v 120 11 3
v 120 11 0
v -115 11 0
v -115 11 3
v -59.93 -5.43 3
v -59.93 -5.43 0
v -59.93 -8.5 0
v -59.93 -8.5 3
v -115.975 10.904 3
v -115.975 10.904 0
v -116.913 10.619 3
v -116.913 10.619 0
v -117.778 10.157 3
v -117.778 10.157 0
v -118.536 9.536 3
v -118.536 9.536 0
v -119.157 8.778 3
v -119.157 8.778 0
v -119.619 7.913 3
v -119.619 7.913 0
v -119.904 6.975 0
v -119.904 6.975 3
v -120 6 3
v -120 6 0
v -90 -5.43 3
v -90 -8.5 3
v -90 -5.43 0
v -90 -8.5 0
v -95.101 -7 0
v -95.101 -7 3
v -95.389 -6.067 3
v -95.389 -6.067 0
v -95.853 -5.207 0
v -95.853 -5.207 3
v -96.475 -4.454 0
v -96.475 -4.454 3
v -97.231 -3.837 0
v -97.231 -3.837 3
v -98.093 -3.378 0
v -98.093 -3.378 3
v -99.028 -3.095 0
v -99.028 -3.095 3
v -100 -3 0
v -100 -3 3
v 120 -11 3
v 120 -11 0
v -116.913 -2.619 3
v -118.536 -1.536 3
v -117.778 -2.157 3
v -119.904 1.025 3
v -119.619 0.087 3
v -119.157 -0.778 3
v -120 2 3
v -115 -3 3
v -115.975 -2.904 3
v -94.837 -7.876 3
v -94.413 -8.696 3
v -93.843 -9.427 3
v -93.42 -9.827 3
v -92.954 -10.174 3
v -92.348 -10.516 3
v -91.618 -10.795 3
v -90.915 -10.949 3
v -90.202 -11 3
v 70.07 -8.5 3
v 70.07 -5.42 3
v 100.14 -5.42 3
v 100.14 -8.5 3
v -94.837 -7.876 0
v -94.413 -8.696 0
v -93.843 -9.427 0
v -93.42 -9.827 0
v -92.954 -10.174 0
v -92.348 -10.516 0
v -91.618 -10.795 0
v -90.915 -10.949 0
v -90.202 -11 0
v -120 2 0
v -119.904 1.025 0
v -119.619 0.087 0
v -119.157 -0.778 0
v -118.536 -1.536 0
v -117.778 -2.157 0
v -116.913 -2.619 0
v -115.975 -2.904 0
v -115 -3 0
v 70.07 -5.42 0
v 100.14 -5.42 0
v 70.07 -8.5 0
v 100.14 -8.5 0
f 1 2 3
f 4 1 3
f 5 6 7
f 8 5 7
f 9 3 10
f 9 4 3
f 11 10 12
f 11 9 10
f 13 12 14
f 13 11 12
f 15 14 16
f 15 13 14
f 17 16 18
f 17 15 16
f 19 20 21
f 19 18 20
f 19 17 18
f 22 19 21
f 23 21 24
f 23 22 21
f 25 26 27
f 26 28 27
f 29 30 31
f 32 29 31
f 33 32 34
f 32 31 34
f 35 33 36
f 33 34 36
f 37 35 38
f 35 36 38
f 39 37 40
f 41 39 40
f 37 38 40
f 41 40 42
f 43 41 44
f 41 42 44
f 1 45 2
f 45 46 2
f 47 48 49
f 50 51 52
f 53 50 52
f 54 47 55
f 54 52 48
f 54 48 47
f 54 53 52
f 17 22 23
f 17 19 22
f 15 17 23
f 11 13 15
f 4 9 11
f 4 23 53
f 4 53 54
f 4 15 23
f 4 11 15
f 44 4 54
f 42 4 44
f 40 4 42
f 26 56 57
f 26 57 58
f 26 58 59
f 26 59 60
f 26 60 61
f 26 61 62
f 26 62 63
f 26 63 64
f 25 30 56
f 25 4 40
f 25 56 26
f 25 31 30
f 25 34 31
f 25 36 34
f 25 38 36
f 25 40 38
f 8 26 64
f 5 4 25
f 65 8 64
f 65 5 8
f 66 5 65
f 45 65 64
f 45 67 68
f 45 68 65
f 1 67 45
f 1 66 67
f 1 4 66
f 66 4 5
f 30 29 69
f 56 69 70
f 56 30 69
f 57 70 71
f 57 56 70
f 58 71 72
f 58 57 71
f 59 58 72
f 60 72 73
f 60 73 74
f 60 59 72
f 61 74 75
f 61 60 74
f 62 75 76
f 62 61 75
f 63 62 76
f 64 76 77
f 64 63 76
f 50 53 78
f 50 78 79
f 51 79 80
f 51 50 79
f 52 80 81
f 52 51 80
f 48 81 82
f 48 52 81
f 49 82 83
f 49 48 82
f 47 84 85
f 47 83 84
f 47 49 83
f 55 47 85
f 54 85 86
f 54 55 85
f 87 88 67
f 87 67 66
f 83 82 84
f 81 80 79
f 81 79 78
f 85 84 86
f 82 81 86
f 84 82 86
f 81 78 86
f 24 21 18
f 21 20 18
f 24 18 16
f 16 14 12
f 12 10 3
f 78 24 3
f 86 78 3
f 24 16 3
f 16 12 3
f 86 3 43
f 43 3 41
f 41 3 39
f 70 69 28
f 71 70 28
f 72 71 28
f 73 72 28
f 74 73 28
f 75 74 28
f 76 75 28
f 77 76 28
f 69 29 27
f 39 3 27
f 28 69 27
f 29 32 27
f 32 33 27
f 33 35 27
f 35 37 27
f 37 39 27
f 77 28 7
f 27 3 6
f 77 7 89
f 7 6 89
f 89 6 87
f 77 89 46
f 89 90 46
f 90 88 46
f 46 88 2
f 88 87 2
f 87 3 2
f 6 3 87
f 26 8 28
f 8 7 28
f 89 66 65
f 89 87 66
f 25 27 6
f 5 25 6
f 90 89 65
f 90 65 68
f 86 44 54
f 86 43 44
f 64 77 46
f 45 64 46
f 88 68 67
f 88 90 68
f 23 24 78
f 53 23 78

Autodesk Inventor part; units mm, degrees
ref_plane "YZ Plane" through (0, 0, 0) normal (1, 0, 0) x (0, 1, 0)
ref_plane "XZ Plane" through (0, 0, 0) normal (0, 1, 0) x (-1, 0, 0)
ref_plane "XY Plane" through (0, 0, 0) normal (0, 0, 1) x (1, 0, 0)
sketch "Sketch1" plane through (0, 0, 0) normal (0, 0, 1) x (1, 0, 0)
  line L0 (-120, -11) -> (120, -11)
  line L1 (120, -11) -> (120, 11)
  line L2 (120, 11) -> (-120, 11)
  line L3 (-120, 11) -> (-120, -11)
  line L4 (-120, -11) -> (120, 11) construction
  line L5 (120, -11) -> (-120, 11) construction
  line L6 (-90, -5.43) -> (-59.93, -5.43)
  line L7 (-59.93, -5.43) -> (-59.93, -8.5)
  line L8 (-59.93, -8.5) -> (-90, -8.5)
  line L9 (-90, -8.5) -> (-90, -5.43)
  line L10 (-90, -5.43) -> (-59.93, -8.5) construction
  line L11 (-59.93, -5.43) -> (-90, -8.5) construction
  line L12 (100.14, -5.42) -> (70.07, -5.42)
  line L13 (70.07, -5.42) -> (70.07, -8.5)
  line L14 (70.07, -8.5) -> (100.14, -8.5)
  line L15 (100.14, -8.5) -> (100.14, -5.42)
  line L16 (100.14, -5.42) -> (70.07, -8.5) construction
  line L17 (70.07, -5.42) -> (100.14, -8.5) construction
  line L18 (-120, -11) -> (-95, -11)
  line L19 (-95, -11) -> (-95, -3)
  line L20 (-95, -3) -> (-120, -3)
  line L21 (-120, -3) -> (-120, -11)
  point P0 (0, 0)
  point P1 (-74.965, -6.965)
  point P2 (85.105, -6.96)
  point P3 (-95, -11)
  dimension "d0" = 240
  dimension "d1" = 22
  dimension "d2" = 30.07
  dimension "d3" = 3.07
  dimension "d4" = 2.5
  dimension "d5" = 30
  dimension "d6" = 30.07
  dimension "d7" = 3.08
  dimension "d8" = 2.5
  dimension "d9" = 130
  dimension "d12" = 25
  dimension "d13" = 8
extrude "Plate1" add sketch "Sketch1" along normal blind 3 contours L19 L20 L3 L2 L1 L0
fillet "Corner Round1" radius 5 4 edges at (-120, 11, 1.5) (-120, -3, 1.5) (-95, -3, 1.5) (-95, -11, 1.5)
equation "\"d10\" = Thickness"
equation "\"BendRadius\" = Thickness"
equation "\"BendReliefWidth\" = Thickness"
equation "\"BendReliefDepth\" = 0.5 * Thickness"
equation "\"CornerReliefSize\" = 4 * Thickness"
equation "\"MinimumRemnant\" = 2 * Thickness"
equation "\"TransitionRadius\" = BendRadius"
equation "\"JacobiRadiusSize\" = BendRadius"
equation "\"GapSize\" = Thickness"
equation "\"Thickness\" = 3"
properties part number "Starting Path Wall"
